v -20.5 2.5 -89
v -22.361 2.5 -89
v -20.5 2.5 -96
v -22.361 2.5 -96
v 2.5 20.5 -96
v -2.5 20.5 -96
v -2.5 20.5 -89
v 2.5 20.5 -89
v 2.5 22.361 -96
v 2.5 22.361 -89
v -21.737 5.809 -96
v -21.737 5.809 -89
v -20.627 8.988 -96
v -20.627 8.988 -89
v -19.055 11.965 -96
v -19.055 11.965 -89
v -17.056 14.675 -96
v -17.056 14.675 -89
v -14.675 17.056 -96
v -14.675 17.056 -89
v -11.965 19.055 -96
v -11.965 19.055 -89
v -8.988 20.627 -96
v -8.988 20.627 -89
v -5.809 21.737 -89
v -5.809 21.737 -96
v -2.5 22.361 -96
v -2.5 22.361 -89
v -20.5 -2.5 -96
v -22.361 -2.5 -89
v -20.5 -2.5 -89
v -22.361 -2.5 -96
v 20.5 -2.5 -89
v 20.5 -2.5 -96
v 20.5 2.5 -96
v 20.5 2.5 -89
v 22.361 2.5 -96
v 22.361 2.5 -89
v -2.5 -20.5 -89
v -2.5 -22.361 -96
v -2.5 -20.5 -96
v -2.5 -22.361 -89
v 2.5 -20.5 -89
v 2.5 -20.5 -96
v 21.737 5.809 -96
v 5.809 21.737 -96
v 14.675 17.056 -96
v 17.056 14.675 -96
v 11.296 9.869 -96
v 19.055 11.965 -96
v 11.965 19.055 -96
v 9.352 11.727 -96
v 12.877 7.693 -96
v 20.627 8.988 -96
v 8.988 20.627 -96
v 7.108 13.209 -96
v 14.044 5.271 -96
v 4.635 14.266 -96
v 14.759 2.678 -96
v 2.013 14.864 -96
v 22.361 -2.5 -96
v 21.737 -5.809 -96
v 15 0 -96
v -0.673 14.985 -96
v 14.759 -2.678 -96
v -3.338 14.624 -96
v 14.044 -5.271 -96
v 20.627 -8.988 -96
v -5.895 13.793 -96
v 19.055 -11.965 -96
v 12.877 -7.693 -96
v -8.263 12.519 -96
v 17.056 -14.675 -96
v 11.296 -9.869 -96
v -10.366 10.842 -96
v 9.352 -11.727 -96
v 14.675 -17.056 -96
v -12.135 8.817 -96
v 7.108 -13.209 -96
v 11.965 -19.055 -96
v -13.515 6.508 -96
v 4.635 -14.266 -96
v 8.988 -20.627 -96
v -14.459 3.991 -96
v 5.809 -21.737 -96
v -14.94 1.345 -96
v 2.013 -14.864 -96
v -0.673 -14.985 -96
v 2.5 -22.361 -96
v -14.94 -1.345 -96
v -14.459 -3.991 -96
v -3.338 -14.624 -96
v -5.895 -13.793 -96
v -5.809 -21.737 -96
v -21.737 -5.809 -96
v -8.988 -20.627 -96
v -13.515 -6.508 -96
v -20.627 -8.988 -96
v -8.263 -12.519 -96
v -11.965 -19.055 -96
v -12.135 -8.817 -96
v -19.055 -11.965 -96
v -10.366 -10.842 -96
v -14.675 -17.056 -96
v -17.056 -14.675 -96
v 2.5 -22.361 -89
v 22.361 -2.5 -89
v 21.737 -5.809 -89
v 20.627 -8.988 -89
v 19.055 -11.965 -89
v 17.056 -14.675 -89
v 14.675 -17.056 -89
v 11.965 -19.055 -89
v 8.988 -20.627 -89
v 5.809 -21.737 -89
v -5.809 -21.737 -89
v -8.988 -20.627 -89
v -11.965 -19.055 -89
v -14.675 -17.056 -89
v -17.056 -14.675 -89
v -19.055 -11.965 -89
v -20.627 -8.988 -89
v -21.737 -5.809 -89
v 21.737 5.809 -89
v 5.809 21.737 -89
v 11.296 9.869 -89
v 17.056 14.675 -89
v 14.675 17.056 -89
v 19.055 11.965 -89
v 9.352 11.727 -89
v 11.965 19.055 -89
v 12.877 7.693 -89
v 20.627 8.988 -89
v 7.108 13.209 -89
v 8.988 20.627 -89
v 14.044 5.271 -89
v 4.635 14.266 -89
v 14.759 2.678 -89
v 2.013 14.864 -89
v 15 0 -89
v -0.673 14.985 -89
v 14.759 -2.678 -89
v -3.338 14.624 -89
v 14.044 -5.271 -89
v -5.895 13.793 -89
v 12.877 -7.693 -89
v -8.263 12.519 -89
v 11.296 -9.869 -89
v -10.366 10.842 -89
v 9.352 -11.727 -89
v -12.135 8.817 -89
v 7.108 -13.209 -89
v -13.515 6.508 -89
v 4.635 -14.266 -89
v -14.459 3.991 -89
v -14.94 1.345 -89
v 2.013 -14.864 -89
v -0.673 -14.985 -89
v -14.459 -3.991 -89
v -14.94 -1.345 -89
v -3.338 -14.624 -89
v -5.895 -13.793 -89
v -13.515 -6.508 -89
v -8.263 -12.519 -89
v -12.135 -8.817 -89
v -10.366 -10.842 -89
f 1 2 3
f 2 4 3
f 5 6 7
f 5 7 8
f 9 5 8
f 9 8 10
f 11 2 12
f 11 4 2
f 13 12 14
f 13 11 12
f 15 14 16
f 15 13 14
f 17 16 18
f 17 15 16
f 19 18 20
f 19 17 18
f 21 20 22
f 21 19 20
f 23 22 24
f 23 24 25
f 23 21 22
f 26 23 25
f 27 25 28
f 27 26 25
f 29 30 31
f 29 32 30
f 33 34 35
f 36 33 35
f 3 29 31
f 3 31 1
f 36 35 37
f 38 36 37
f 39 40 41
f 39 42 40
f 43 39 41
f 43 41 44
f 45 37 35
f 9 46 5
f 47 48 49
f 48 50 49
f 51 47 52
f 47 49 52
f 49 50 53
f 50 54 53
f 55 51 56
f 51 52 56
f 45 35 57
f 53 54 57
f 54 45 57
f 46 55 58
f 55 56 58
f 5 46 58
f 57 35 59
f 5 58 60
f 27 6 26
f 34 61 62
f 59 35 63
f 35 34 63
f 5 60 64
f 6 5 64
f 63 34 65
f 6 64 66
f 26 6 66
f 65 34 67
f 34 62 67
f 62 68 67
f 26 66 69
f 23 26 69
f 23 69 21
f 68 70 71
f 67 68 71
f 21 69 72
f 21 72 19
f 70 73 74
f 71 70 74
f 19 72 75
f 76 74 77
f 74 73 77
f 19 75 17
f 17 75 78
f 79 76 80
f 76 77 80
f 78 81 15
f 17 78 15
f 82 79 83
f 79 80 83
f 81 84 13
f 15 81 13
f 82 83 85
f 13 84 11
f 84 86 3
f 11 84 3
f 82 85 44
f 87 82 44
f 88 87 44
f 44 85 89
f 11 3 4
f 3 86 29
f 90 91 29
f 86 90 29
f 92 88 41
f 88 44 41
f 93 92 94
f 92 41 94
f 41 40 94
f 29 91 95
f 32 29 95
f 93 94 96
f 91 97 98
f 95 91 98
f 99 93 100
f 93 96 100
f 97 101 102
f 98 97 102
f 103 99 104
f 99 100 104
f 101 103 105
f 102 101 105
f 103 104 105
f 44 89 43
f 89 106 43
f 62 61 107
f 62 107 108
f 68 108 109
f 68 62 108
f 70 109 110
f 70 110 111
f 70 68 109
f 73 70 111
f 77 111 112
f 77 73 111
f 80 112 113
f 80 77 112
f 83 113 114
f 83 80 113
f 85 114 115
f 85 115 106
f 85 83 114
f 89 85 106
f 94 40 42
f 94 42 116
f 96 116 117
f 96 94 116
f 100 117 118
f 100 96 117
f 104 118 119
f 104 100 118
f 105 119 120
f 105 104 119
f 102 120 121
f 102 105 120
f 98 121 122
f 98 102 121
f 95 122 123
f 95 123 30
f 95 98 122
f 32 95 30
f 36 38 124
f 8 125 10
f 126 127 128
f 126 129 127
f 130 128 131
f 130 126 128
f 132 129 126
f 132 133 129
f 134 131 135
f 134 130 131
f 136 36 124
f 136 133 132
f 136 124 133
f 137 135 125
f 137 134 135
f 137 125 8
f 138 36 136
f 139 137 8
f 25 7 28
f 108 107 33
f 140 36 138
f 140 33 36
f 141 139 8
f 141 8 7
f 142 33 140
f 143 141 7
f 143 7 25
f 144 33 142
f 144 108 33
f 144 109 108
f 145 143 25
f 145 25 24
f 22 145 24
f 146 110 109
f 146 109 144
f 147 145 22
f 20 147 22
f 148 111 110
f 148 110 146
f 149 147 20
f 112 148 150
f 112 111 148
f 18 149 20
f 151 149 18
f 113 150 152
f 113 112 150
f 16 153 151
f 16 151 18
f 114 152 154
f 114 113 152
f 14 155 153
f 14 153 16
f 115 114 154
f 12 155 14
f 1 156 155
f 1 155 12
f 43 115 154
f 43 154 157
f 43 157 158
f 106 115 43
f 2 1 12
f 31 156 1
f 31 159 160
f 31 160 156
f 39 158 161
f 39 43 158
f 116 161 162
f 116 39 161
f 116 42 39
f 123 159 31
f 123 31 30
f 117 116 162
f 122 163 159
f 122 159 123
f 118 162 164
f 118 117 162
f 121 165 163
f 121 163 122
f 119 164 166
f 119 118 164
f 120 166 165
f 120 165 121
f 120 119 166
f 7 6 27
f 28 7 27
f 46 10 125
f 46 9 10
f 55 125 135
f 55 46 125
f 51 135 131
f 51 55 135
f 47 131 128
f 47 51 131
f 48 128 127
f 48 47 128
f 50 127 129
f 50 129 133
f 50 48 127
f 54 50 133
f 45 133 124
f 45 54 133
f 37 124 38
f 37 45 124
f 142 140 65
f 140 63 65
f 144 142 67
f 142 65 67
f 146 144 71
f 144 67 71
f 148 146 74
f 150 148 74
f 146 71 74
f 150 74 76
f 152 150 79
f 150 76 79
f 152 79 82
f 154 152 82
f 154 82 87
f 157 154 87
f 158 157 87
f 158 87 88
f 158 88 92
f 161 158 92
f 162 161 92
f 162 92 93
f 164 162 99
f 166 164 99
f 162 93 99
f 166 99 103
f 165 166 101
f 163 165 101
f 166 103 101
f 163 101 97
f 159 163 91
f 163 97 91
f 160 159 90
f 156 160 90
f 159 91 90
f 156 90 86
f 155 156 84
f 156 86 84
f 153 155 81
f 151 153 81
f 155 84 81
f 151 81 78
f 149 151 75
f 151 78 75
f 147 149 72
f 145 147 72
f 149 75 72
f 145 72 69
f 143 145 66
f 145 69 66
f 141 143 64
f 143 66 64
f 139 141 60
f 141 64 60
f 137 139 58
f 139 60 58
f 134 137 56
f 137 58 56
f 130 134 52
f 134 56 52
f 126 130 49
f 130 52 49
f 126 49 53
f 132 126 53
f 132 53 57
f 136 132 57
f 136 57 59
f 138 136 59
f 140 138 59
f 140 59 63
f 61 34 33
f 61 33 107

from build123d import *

# Parameters (mm, degrees)
SKETCH1_W            = 7.5
SKETCH1_H            = 7
SKETCH2_W            = 3
SKETCH2_H            = 5
SKETCH2_W_2          = 5
SKETCH2_H_2          = 3
CUT_4XSLOT_5X2_DEPTH = 150


with BuildPart() as part:
    # Sketch1 → REV_KM6_M30x1.5_45x7 (revolve)
    with BuildSketch(Plane(origin=(0, 0, 0), x_dir=(1, 0, 0), z_dir=(0, 1, 0))):
        with Locations((18.75, 92.5)):
            Rectangle(SKETCH1_W, SKETCH1_H)
    revolve(axis=Axis((0, 0, 150), (0, 0, -1)))

    # Sketch2 → CUT_4xSlot_5x2 (cut, symmetric)
    with BuildSketch(Plane.XY):
        with Locations((22, 0)):
            Rectangle(SKETCH2_W, SKETCH2_H)
        with Locations((-22, 0)):
            Rectangle(SKETCH2_W, SKETCH2_H)
        with Locations((0, 22)):
            Rectangle(SKETCH2_W_2, SKETCH2_H_2)
        with Locations((0, -22)):
            Rectangle(SKETCH2_W_2, SKETCH2_H_2)
    extrude(amount=CUT_4XSLOT_5X2_DEPTH, both=True, mode=Mode.SUBTRACT)


solid = part.part
